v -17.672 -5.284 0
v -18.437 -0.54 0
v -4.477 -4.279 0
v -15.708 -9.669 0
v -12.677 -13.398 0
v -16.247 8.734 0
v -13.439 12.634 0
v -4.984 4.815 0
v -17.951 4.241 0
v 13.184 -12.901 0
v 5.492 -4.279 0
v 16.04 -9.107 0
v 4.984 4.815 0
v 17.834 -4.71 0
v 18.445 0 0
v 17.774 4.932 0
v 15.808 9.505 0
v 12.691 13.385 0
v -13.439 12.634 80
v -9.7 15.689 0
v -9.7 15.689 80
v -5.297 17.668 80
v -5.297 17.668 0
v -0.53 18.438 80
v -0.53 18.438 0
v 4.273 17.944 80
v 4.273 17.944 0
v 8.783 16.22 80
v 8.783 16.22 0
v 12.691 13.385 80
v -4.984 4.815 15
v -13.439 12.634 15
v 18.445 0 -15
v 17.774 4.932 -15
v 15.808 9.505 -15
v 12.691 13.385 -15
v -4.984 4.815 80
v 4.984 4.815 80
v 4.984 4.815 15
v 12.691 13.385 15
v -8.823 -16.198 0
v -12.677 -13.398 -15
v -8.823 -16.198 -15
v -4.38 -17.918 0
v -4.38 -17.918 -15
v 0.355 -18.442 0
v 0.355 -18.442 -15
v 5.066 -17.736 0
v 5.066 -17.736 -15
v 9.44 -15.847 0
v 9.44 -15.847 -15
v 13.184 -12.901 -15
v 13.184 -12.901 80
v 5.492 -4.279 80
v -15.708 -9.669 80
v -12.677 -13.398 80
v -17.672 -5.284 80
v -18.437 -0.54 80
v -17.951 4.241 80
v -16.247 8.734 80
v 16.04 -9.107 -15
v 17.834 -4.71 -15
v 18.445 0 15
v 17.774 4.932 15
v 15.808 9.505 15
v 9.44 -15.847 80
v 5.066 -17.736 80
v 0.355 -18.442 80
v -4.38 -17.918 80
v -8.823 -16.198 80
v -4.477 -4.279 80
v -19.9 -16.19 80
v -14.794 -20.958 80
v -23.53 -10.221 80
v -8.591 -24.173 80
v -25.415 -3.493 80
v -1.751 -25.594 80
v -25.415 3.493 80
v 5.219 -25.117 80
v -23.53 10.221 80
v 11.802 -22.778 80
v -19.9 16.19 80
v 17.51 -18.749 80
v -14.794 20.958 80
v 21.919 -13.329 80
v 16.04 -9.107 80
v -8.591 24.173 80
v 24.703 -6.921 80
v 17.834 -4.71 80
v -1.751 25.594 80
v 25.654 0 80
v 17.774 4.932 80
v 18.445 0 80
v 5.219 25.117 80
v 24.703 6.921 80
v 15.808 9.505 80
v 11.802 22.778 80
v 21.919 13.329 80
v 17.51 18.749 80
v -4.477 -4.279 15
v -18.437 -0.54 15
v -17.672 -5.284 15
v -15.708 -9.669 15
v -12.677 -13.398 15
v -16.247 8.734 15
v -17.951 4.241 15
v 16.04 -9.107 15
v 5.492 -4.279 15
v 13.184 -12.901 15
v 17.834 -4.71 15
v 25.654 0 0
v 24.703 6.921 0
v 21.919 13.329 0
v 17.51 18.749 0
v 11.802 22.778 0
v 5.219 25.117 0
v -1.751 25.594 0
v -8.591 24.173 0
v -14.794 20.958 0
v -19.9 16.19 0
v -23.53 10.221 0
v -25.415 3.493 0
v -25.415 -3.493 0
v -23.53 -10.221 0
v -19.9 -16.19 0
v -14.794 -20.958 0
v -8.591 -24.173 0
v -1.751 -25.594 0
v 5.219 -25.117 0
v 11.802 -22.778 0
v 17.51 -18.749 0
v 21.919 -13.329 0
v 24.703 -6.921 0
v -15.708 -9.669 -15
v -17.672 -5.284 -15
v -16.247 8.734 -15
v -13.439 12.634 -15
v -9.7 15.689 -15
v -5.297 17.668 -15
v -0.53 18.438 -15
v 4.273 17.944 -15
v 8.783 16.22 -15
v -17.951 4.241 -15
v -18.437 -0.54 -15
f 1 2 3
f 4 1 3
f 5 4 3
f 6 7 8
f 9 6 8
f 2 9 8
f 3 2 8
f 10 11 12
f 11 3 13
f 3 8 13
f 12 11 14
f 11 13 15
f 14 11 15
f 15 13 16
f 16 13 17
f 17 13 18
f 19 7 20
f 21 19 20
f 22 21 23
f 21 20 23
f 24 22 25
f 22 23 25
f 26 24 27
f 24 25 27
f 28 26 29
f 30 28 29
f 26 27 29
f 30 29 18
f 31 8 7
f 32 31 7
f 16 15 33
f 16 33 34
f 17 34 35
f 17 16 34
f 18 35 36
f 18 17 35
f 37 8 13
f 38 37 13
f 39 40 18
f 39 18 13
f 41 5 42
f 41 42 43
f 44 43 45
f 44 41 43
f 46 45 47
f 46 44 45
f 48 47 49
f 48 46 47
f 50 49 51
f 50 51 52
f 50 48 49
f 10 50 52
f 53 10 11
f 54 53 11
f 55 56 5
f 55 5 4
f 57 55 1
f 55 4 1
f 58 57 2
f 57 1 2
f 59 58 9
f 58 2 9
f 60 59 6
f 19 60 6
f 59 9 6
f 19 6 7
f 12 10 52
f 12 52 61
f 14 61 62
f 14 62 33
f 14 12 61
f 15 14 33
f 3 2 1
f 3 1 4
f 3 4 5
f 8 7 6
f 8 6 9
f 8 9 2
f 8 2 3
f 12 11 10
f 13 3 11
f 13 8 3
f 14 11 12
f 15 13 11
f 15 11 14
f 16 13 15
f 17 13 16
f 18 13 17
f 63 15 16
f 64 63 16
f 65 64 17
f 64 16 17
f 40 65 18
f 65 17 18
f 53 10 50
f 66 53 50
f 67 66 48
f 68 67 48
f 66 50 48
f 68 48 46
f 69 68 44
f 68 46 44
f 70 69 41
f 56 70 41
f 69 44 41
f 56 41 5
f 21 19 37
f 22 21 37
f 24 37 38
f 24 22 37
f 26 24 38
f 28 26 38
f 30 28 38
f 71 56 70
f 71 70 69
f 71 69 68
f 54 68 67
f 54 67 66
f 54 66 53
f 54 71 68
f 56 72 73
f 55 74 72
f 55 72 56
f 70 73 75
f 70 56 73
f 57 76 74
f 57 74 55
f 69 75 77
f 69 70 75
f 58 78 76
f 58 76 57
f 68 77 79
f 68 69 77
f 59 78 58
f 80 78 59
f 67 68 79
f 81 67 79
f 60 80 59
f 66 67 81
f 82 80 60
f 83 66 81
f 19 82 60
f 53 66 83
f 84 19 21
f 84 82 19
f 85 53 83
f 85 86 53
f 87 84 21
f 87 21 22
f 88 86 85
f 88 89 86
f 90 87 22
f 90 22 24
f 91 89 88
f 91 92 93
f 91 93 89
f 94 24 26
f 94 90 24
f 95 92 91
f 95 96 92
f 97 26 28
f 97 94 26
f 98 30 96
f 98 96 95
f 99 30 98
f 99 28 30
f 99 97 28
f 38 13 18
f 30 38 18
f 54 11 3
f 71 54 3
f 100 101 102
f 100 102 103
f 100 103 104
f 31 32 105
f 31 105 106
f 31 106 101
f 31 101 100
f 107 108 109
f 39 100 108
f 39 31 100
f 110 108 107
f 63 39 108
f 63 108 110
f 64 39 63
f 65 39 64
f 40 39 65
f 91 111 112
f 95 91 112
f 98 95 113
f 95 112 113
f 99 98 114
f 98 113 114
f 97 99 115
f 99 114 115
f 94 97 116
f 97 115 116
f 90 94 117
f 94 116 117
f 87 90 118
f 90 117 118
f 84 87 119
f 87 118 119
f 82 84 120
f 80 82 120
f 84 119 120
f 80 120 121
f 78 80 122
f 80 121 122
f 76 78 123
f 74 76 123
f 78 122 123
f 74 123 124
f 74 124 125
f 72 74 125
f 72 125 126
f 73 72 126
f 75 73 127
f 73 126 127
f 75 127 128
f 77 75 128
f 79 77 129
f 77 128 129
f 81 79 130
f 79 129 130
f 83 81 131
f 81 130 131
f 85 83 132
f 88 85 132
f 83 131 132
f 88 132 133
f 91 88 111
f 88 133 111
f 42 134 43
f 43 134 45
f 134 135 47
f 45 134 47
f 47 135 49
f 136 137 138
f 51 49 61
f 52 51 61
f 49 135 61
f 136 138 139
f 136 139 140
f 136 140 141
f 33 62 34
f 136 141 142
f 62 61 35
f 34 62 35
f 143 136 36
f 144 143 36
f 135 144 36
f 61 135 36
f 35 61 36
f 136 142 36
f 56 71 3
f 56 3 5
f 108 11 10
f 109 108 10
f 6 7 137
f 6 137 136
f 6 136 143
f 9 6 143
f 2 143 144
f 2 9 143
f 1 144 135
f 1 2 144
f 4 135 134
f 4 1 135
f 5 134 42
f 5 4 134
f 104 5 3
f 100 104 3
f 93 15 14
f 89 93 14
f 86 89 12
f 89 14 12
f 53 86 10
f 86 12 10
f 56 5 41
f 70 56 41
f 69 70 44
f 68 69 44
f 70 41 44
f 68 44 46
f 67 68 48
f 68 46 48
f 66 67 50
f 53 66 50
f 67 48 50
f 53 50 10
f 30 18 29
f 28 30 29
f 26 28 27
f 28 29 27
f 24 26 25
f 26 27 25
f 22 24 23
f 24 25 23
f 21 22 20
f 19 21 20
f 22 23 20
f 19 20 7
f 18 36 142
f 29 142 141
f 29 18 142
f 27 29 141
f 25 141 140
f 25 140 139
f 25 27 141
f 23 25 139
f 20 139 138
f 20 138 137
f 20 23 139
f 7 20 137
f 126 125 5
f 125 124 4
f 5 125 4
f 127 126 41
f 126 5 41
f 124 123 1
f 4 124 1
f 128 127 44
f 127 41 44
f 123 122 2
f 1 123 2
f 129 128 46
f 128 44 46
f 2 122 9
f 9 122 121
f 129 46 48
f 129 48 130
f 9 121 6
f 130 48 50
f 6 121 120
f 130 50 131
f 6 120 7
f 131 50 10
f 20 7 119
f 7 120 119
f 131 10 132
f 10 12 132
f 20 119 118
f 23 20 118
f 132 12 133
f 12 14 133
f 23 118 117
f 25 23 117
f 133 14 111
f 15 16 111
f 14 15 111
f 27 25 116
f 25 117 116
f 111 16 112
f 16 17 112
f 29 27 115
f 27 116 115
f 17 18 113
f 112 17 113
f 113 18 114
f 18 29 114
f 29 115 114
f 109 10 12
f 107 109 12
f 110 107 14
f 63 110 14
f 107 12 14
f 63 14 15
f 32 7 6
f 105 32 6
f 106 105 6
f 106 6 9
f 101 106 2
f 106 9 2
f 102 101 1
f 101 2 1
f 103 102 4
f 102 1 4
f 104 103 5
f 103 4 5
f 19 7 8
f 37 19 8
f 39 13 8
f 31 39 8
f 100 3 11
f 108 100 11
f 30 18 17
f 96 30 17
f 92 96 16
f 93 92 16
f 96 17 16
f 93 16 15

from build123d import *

# Parameters (mm, degrees)
F1_DEPTH = 15
F2_DEPTH = 15
F3_DEPTH = 80
F0_R     = 25.653928931
F4_DEPTH = 80


with BuildPart() as f1:
    # F0 (on Top) → F1 (new body)
    with BuildSketch(Plane.XY):
        with BuildLine():
            ThreePointArc((13.1836396394, -12.900506629), (17.0793508005, -6.9661468302), (18.4453632501, 0))
            ThreePointArc((18.4453632501, 0), (16.9458069689, 7.2849880988), (12.6909575623, 13.3854780108))
            Line((12.6909575623, 13.3854780108), (4.9841781147, 4.8152967356))
            Line((4.9841781147, 4.8152967356), (-4.9841781147, 4.8152967356))
            Line((-4.9841781147, 4.8152967356), (-13.4393265471, 12.6339197159))
            ThreePointArc((-13.4393265471, 12.6339197159), (-18.4374669621, -0.5396641983), (-12.6773625282, -13.398354554))
            Line((-12.6773625282, -13.398354554), (-4.4766523545, -4.2789067677))
            Line((-4.4766523545, -4.2789067677), (5.4917038749, -4.2789067677))
            Line((5.4917038749, -4.2789067677), (13.1836396394, -12.900506629))
        make_face()
    extrude(amount=F1_DEPTH)


with BuildPart() as f2:
    # F0 (on Top) → F2 (new body)
    with BuildSketch(Plane.XY):
        with BuildLine():
            Line((4.9841781147, 4.8152967356), (12.6909575623, 13.3854780108))
            ThreePointArc((12.6909575623, 13.3854780108), (-0.5303055742, 18.4377385117), (-13.4393265471, 12.6339197159))
            Line((-13.4393265471, 12.6339197159), (-4.9841781147, 4.8152967356))
            Line((-4.9841781147, 4.8152967356), (4.9841781147, 4.8152967356))
        make_face()
        with BuildLine():
            ThreePointArc((13.1836396394, -12.900506629), (17.0793508005, -6.9661468302), (18.4453632501, 0))
            ThreePointArc((18.4453632501, 0), (16.9458069689, 7.2849880988), (12.6909575623, 13.3854780108))
            Line((12.6909575623, 13.3854780108), (4.9841781147, 4.8152967356))
            Line((4.9841781147, 4.8152967356), (-4.9841781147, 4.8152967356))
            Line((-4.9841781147, 4.8152967356), (-13.4393265471, 12.6339197159))
            ThreePointArc((-13.4393265471, 12.6339197159), (-18.4374669621, -0.5396641983), (-12.6773625282, -13.398354554))
            Line((-12.6773625282, -13.398354554), (-4.4766523545, -4.2789067677))
            Line((-4.4766523545, -4.2789067677), (5.4917038749, -4.2789067677))
            Line((5.4917038749, -4.2789067677), (13.1836396394, -12.900506629))
        make_face()
        with BuildLine():
            ThreePointArc((-12.6773625282, -13.398354554), (0.3550243195, -18.4419462953), (13.1836396394, -12.900506629))
            Line((13.1836396394, -12.900506629), (5.4917038749, -4.2789067677))
            Line((5.4917038749, -4.2789067677), (-4.4766523545, -4.2789067677))
            Line((-4.4766523545, -4.2789067677), (-12.6773625282, -13.398354554))
        make_face()
    extrude(amount=-F2_DEPTH)

    # F0 (on Top) → F3 (join)
    with BuildSketch(Plane.XY):
        with BuildLine():
            ThreePointArc((-12.6773625282, -13.398354554), (0.3550243195, -18.4419462953), (13.1836396394, -12.900506629))
            Line((13.1836396394, -12.900506629), (5.4917038749, -4.2789067677))
            Line((5.4917038749, -4.2789067677), (-4.4766523545, -4.2789067677))
            Line((-4.4766523545, -4.2789067677), (-12.6773625282, -13.398354554))
        make_face()
        with BuildLine():
            Line((4.9841781147, 4.8152967356), (12.6909575623, 13.3854780108))
            ThreePointArc((12.6909575623, 13.3854780108), (-0.5303055742, 18.4377385117), (-13.4393265471, 12.6339197159))
            Line((-13.4393265471, 12.6339197159), (-4.9841781147, 4.8152967356))
            Line((-4.9841781147, 4.8152967356), (4.9841781147, 4.8152967356))
        make_face()
    extrude(amount=F3_DEPTH)


with BuildPart() as f4:
    # F0 (on Top) → F4 (new body)
    with BuildSketch(Plane.XY):
        Circle(F0_R)
        with BuildLine():
            ThreePointArc((12.6909575623, 13.3854780108), (16.9458069689, 7.2849880988), (18.4453632501, 0))
            ThreePointArc((18.4453632501, 0), (17.0793508005, -6.9661468302), (13.1836396394, -12.900506629))
            ThreePointArc((13.1836396394, -12.900506629), (0.3550243195, -18.4419462953), (-12.6773625282, -13.398354554))
            ThreePointArc((-12.6773625282, -13.398354554), (-18.4374669621, -0.5396641983), (-13.4393265471, 12.6339197159))
            ThreePointArc((-13.4393265471, 12.6339197159), (-0.5303055742, 18.4377385117), (12.6909575623, 13.3854780108))
        make_face(mode=Mode.SUBTRACT)
    extrude(amount=F4_DEPTH)


solid = Compound([f1.part, f2.part, f4.part])
